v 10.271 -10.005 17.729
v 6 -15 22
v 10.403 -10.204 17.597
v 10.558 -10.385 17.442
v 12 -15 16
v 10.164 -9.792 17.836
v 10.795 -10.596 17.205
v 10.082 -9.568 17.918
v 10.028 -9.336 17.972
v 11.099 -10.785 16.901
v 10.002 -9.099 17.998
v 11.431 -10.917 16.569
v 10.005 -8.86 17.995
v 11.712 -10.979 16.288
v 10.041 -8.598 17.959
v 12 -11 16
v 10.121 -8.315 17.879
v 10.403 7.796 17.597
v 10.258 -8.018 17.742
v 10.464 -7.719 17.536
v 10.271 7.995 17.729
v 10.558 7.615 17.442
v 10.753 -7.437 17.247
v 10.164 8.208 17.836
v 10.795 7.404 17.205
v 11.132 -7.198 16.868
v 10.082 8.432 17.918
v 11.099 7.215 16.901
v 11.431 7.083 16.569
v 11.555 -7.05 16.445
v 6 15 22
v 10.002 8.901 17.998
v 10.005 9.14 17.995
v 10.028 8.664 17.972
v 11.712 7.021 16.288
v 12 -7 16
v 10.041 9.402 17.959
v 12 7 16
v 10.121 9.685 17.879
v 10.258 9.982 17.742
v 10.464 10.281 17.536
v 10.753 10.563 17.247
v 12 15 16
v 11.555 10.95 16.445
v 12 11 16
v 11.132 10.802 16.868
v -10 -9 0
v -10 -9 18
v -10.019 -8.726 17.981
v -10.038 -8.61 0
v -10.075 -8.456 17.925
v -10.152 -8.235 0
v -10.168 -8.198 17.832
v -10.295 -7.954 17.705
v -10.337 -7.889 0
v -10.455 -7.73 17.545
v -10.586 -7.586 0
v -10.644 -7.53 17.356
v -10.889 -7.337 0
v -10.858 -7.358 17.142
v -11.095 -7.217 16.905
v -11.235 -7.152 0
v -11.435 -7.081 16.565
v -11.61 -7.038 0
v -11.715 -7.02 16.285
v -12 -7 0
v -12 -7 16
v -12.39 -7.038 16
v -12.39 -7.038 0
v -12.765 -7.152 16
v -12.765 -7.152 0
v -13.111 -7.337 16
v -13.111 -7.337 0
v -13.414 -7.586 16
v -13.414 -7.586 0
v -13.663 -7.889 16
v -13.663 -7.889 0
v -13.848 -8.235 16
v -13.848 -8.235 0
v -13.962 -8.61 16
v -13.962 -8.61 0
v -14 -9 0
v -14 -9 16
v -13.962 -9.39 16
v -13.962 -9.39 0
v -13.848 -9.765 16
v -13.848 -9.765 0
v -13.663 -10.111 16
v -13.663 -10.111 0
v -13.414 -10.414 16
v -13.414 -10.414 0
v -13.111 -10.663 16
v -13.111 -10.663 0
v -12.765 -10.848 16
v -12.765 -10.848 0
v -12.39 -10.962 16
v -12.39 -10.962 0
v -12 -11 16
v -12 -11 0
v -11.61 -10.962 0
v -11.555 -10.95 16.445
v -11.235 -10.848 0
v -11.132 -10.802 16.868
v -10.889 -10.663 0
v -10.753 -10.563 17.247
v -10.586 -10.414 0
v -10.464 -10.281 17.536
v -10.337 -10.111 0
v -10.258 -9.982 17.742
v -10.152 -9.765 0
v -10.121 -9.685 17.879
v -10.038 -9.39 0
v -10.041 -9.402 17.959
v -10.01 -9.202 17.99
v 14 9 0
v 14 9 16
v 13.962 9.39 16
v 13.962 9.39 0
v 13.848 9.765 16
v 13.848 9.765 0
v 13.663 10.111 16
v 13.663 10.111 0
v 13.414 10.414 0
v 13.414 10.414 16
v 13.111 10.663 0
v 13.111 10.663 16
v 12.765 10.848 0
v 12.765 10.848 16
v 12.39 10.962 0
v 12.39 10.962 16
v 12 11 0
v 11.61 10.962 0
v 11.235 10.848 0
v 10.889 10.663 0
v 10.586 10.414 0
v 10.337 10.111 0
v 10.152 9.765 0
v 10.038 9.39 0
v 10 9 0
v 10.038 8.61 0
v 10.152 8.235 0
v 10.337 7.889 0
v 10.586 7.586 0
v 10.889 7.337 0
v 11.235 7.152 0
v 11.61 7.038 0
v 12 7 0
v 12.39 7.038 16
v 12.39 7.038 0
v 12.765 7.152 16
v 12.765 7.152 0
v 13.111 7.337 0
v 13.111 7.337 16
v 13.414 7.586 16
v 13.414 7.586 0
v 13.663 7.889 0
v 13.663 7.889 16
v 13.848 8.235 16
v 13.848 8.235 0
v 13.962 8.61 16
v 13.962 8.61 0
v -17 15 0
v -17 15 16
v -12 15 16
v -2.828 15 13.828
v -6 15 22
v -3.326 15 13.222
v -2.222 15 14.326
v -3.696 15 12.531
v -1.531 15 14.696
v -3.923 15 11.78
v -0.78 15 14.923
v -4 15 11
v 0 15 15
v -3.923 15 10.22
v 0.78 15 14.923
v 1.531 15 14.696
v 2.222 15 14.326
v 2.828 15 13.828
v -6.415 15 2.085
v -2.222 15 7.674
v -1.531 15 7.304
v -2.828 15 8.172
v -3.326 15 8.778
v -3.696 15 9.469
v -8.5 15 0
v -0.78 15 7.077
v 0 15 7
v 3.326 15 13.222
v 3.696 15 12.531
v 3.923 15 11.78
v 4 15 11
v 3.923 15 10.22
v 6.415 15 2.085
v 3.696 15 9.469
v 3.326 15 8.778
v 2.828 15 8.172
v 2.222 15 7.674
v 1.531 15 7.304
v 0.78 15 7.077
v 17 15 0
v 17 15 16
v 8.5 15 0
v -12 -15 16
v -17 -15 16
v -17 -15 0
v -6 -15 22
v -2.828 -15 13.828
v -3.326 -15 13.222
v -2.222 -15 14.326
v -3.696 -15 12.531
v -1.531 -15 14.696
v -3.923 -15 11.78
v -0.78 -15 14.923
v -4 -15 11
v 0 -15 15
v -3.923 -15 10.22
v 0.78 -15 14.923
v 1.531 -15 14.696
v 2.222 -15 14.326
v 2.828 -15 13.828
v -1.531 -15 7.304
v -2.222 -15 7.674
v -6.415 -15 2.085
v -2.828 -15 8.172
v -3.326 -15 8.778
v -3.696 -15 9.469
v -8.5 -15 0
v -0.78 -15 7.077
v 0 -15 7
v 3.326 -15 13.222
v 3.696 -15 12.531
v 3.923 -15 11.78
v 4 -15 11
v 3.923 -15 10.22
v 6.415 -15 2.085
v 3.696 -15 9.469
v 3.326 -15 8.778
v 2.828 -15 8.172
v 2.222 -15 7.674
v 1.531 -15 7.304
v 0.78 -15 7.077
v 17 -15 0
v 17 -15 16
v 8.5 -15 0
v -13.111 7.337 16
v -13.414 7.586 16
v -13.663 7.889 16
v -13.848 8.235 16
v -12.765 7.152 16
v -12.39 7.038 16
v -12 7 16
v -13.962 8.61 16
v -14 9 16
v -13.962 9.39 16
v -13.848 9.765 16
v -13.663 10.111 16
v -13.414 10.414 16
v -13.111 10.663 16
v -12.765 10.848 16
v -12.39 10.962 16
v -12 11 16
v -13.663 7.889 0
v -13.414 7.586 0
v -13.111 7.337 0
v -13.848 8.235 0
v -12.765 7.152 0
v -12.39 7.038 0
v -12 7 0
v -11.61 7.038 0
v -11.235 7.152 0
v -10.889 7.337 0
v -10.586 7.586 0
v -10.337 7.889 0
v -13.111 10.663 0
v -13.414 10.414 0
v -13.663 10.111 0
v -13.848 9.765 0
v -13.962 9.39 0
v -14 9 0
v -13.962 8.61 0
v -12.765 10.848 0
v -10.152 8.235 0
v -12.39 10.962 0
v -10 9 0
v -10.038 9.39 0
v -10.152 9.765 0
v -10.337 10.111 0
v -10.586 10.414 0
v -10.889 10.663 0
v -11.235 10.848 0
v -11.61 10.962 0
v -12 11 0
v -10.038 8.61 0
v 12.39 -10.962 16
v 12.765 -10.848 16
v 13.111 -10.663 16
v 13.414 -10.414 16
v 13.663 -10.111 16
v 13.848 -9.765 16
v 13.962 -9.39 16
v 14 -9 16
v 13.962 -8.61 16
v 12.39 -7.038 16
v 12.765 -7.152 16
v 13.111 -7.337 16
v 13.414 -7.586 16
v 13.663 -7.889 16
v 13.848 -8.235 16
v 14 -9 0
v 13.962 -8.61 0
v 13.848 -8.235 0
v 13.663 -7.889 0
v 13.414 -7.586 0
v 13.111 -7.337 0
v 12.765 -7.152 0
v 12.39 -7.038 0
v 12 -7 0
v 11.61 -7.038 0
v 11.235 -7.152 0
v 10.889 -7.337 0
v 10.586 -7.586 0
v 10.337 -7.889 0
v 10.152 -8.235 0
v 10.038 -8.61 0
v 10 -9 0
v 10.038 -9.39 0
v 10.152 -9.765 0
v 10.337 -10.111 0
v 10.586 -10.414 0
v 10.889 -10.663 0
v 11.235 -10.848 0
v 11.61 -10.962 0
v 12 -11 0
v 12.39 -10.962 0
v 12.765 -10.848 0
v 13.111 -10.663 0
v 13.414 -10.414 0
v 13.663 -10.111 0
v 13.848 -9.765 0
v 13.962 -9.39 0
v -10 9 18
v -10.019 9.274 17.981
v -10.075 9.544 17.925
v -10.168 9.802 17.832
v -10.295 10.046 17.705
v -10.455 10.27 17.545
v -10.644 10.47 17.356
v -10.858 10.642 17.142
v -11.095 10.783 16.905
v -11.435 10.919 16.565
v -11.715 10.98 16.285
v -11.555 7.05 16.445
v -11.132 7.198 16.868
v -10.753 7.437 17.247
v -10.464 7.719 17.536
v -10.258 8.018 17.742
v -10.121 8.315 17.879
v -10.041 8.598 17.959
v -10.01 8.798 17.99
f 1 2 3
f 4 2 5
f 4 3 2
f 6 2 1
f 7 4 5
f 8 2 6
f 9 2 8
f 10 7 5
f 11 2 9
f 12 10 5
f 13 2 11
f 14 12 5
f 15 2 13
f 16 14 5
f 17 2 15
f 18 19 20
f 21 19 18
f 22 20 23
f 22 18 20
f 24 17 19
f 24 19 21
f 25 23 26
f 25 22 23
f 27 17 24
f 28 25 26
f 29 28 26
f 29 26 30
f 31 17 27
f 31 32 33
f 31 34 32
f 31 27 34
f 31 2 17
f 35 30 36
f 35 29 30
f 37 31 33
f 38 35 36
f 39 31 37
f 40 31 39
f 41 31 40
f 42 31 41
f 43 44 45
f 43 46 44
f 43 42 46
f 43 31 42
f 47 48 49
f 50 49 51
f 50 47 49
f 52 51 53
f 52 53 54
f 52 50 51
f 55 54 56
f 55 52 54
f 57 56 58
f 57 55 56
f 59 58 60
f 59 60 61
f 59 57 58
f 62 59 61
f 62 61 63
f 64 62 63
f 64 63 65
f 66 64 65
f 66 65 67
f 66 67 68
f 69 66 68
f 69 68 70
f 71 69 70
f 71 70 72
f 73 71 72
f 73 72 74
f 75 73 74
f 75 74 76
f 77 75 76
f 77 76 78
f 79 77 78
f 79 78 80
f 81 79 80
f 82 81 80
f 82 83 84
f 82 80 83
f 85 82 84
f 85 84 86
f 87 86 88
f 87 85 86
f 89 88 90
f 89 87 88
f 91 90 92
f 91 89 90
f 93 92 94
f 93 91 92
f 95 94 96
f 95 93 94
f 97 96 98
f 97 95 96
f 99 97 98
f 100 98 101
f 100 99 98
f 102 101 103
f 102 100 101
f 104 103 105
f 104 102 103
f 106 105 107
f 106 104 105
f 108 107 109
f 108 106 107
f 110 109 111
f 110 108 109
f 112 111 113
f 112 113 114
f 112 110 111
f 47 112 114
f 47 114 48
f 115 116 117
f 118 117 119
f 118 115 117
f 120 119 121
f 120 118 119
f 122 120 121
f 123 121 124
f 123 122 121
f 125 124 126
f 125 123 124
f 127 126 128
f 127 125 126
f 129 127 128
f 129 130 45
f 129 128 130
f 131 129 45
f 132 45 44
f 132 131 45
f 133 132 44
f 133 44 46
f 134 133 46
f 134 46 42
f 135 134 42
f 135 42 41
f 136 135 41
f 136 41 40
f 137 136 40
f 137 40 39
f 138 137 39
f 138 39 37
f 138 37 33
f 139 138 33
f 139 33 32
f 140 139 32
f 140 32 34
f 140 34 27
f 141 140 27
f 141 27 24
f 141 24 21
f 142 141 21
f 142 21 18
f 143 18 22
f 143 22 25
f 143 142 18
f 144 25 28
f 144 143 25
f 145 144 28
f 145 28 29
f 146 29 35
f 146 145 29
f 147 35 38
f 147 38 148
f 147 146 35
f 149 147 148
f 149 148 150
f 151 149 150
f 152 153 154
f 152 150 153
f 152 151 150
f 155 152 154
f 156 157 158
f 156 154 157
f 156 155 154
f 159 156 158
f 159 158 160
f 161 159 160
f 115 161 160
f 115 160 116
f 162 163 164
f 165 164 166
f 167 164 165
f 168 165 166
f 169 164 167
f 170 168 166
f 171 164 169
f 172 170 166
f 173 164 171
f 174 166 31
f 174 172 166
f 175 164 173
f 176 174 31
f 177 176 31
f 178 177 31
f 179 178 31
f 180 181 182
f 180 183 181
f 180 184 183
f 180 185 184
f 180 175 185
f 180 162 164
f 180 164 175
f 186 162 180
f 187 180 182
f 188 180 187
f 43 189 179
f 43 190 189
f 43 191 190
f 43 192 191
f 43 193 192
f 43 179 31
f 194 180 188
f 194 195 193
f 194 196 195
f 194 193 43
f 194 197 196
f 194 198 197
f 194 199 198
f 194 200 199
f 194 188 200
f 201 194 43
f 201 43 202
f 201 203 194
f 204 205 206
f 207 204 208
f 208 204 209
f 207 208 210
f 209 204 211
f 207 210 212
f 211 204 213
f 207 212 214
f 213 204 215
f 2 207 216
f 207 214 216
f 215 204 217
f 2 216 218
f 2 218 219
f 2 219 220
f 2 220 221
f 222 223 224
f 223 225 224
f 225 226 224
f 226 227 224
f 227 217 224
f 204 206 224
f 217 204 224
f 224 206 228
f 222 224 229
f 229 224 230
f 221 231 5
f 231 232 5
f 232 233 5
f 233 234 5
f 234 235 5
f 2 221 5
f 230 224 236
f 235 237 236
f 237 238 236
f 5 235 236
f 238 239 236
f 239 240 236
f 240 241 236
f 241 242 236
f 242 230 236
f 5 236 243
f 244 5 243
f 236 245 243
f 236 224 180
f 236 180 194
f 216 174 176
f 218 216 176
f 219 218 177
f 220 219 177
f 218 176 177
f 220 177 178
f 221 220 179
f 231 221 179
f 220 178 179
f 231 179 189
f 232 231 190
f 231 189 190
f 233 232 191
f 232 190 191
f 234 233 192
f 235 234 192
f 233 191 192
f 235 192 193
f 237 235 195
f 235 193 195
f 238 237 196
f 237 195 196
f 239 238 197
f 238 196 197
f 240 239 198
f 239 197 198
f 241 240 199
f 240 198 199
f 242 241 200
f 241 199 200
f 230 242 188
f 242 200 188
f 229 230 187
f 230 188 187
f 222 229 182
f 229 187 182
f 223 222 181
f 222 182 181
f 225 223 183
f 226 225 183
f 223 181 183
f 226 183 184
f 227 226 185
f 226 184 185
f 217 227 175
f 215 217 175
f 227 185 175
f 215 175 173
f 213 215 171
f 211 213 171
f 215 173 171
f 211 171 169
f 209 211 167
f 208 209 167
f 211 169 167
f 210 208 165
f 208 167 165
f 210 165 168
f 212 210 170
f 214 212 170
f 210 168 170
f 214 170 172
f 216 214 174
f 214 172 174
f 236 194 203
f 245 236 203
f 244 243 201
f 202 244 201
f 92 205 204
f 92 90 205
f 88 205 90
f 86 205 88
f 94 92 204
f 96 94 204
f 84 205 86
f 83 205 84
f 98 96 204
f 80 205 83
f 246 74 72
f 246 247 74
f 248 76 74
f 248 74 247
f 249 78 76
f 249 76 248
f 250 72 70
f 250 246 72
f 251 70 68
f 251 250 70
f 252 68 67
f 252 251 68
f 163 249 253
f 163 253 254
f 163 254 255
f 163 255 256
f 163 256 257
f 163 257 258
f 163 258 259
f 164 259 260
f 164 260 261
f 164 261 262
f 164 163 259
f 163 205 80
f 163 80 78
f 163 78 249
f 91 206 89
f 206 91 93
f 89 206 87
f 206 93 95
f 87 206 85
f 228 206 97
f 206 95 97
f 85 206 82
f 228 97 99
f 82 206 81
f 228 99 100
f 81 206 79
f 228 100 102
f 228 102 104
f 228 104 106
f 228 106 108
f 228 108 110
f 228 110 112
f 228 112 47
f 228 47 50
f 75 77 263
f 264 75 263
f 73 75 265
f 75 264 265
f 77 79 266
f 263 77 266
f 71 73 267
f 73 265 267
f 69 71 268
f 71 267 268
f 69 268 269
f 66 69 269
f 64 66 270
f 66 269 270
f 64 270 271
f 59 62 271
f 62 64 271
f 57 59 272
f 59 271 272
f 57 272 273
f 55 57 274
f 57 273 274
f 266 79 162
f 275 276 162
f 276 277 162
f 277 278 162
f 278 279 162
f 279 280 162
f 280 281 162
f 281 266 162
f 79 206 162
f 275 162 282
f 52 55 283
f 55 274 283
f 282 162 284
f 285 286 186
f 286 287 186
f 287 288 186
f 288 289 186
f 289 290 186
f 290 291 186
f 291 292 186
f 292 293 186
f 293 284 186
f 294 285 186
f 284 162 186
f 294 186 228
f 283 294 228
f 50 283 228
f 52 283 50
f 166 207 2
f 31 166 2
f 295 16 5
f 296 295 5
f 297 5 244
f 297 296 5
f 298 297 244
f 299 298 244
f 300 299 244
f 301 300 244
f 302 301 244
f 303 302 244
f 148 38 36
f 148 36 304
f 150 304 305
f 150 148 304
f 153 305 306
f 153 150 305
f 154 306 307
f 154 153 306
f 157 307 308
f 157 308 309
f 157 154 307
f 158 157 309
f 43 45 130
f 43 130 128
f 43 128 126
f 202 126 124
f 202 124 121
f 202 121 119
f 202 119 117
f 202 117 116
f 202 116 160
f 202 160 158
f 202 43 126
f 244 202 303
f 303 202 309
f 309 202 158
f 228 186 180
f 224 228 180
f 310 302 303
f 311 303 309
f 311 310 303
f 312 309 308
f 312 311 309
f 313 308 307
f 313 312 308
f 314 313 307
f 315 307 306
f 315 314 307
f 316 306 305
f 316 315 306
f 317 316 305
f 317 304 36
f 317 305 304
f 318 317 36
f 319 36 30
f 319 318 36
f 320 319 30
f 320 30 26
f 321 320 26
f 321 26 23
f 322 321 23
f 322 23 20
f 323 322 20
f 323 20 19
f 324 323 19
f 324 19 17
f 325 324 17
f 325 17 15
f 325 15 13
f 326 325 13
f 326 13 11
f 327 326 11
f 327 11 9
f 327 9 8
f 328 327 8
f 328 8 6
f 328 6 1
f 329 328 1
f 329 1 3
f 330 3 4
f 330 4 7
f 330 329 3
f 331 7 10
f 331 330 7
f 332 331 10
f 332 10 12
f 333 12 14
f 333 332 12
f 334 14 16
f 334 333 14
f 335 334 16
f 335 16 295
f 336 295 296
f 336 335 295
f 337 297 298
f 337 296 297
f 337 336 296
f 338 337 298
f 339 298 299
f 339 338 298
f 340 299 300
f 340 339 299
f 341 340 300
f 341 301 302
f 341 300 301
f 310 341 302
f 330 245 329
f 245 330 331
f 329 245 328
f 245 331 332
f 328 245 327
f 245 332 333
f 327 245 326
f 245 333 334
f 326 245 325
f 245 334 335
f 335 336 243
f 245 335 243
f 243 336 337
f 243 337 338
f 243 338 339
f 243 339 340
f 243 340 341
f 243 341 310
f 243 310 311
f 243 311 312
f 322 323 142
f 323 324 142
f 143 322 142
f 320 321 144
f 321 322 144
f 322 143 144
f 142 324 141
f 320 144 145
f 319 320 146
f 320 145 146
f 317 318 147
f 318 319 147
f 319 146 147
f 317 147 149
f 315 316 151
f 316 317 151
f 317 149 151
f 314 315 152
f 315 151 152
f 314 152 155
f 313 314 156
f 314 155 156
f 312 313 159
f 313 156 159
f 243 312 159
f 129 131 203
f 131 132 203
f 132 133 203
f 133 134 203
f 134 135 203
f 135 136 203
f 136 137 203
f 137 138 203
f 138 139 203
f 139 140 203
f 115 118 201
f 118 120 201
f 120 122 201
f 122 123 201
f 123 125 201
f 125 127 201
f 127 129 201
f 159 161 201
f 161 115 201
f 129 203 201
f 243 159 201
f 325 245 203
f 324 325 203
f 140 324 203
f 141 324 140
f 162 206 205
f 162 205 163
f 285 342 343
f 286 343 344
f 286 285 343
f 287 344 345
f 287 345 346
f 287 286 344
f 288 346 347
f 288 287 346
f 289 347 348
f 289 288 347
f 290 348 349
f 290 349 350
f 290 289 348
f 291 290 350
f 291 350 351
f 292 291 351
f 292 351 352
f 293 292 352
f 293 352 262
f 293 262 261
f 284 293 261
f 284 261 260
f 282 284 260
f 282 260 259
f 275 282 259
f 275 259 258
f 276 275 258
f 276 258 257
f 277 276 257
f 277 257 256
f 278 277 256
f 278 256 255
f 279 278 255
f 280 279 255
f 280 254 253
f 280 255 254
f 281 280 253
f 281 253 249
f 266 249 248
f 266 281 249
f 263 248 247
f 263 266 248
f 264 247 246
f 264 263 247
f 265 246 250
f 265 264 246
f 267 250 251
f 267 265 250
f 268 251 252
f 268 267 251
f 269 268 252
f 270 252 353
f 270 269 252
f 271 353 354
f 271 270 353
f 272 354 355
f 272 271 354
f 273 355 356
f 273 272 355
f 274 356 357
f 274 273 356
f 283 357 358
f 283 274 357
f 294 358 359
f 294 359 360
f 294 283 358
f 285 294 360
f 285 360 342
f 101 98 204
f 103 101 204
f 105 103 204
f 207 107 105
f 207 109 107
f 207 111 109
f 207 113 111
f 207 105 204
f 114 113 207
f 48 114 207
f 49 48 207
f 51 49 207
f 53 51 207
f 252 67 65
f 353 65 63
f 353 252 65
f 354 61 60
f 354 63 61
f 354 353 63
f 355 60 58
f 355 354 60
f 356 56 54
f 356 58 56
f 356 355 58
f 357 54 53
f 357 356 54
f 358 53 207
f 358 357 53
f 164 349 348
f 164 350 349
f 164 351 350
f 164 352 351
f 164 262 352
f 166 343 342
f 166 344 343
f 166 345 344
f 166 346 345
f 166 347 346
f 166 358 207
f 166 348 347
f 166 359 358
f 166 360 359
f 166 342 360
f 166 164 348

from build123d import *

# Parameters (mm, degrees)
SKETCH1_W           = 34
SKETCH1_H           = 30
SKETCH1_R           = 2
BOSS_EXTRUDE1_DEPTH = 22
SKETCH3_R           = 4
CUT_EXTRUDE1_DEPTH  = 30


with BuildPart() as part:
    # Sketch1 → Boss-Extrude1 (new body)
    with BuildSketch(Plane.XY):
        Rectangle(SKETCH1_W, SKETCH1_H)
        with Locations((-12, 9)):
            Circle(SKETCH1_R, mode=Mode.SUBTRACT)
        with Locations((-12, -9)):
            Circle(SKETCH1_R, mode=Mode.SUBTRACT)
        with Locations((12, 9)):
            Circle(SKETCH1_R, mode=Mode.SUBTRACT)
        with Locations((12, -9)):
            Circle(SKETCH1_R, mode=Mode.SUBTRACT)
    extrude(amount=BOSS_EXTRUDE1_DEPTH)

    # Sketch3 → Cut-Extrude1 (cut)
    with BuildSketch(Plane(origin=(0, 15, 0), x_dir=(1, 0, 0), z_dir=(0, 1, 0))):
        with Locations(Location((0, -11, 0), (0, 0, 270))):
            Circle(SKETCH3_R)
        Polygon((-17, -16), (-12, -16), (-6, -22), (-17, -22), align=None)
        Polygon((17, -22), (6, -22), (12, -16), (17, -16), align=None)
        Polygon((-8.5, 0), (-6.414897811, -2.085102189), (6.414897811, -2.085102189), (8.5, 0), align=None)
    extrude(amount=-CUT_EXTRUDE1_DEPTH, mode=Mode.SUBTRACT)


solid = part.part
